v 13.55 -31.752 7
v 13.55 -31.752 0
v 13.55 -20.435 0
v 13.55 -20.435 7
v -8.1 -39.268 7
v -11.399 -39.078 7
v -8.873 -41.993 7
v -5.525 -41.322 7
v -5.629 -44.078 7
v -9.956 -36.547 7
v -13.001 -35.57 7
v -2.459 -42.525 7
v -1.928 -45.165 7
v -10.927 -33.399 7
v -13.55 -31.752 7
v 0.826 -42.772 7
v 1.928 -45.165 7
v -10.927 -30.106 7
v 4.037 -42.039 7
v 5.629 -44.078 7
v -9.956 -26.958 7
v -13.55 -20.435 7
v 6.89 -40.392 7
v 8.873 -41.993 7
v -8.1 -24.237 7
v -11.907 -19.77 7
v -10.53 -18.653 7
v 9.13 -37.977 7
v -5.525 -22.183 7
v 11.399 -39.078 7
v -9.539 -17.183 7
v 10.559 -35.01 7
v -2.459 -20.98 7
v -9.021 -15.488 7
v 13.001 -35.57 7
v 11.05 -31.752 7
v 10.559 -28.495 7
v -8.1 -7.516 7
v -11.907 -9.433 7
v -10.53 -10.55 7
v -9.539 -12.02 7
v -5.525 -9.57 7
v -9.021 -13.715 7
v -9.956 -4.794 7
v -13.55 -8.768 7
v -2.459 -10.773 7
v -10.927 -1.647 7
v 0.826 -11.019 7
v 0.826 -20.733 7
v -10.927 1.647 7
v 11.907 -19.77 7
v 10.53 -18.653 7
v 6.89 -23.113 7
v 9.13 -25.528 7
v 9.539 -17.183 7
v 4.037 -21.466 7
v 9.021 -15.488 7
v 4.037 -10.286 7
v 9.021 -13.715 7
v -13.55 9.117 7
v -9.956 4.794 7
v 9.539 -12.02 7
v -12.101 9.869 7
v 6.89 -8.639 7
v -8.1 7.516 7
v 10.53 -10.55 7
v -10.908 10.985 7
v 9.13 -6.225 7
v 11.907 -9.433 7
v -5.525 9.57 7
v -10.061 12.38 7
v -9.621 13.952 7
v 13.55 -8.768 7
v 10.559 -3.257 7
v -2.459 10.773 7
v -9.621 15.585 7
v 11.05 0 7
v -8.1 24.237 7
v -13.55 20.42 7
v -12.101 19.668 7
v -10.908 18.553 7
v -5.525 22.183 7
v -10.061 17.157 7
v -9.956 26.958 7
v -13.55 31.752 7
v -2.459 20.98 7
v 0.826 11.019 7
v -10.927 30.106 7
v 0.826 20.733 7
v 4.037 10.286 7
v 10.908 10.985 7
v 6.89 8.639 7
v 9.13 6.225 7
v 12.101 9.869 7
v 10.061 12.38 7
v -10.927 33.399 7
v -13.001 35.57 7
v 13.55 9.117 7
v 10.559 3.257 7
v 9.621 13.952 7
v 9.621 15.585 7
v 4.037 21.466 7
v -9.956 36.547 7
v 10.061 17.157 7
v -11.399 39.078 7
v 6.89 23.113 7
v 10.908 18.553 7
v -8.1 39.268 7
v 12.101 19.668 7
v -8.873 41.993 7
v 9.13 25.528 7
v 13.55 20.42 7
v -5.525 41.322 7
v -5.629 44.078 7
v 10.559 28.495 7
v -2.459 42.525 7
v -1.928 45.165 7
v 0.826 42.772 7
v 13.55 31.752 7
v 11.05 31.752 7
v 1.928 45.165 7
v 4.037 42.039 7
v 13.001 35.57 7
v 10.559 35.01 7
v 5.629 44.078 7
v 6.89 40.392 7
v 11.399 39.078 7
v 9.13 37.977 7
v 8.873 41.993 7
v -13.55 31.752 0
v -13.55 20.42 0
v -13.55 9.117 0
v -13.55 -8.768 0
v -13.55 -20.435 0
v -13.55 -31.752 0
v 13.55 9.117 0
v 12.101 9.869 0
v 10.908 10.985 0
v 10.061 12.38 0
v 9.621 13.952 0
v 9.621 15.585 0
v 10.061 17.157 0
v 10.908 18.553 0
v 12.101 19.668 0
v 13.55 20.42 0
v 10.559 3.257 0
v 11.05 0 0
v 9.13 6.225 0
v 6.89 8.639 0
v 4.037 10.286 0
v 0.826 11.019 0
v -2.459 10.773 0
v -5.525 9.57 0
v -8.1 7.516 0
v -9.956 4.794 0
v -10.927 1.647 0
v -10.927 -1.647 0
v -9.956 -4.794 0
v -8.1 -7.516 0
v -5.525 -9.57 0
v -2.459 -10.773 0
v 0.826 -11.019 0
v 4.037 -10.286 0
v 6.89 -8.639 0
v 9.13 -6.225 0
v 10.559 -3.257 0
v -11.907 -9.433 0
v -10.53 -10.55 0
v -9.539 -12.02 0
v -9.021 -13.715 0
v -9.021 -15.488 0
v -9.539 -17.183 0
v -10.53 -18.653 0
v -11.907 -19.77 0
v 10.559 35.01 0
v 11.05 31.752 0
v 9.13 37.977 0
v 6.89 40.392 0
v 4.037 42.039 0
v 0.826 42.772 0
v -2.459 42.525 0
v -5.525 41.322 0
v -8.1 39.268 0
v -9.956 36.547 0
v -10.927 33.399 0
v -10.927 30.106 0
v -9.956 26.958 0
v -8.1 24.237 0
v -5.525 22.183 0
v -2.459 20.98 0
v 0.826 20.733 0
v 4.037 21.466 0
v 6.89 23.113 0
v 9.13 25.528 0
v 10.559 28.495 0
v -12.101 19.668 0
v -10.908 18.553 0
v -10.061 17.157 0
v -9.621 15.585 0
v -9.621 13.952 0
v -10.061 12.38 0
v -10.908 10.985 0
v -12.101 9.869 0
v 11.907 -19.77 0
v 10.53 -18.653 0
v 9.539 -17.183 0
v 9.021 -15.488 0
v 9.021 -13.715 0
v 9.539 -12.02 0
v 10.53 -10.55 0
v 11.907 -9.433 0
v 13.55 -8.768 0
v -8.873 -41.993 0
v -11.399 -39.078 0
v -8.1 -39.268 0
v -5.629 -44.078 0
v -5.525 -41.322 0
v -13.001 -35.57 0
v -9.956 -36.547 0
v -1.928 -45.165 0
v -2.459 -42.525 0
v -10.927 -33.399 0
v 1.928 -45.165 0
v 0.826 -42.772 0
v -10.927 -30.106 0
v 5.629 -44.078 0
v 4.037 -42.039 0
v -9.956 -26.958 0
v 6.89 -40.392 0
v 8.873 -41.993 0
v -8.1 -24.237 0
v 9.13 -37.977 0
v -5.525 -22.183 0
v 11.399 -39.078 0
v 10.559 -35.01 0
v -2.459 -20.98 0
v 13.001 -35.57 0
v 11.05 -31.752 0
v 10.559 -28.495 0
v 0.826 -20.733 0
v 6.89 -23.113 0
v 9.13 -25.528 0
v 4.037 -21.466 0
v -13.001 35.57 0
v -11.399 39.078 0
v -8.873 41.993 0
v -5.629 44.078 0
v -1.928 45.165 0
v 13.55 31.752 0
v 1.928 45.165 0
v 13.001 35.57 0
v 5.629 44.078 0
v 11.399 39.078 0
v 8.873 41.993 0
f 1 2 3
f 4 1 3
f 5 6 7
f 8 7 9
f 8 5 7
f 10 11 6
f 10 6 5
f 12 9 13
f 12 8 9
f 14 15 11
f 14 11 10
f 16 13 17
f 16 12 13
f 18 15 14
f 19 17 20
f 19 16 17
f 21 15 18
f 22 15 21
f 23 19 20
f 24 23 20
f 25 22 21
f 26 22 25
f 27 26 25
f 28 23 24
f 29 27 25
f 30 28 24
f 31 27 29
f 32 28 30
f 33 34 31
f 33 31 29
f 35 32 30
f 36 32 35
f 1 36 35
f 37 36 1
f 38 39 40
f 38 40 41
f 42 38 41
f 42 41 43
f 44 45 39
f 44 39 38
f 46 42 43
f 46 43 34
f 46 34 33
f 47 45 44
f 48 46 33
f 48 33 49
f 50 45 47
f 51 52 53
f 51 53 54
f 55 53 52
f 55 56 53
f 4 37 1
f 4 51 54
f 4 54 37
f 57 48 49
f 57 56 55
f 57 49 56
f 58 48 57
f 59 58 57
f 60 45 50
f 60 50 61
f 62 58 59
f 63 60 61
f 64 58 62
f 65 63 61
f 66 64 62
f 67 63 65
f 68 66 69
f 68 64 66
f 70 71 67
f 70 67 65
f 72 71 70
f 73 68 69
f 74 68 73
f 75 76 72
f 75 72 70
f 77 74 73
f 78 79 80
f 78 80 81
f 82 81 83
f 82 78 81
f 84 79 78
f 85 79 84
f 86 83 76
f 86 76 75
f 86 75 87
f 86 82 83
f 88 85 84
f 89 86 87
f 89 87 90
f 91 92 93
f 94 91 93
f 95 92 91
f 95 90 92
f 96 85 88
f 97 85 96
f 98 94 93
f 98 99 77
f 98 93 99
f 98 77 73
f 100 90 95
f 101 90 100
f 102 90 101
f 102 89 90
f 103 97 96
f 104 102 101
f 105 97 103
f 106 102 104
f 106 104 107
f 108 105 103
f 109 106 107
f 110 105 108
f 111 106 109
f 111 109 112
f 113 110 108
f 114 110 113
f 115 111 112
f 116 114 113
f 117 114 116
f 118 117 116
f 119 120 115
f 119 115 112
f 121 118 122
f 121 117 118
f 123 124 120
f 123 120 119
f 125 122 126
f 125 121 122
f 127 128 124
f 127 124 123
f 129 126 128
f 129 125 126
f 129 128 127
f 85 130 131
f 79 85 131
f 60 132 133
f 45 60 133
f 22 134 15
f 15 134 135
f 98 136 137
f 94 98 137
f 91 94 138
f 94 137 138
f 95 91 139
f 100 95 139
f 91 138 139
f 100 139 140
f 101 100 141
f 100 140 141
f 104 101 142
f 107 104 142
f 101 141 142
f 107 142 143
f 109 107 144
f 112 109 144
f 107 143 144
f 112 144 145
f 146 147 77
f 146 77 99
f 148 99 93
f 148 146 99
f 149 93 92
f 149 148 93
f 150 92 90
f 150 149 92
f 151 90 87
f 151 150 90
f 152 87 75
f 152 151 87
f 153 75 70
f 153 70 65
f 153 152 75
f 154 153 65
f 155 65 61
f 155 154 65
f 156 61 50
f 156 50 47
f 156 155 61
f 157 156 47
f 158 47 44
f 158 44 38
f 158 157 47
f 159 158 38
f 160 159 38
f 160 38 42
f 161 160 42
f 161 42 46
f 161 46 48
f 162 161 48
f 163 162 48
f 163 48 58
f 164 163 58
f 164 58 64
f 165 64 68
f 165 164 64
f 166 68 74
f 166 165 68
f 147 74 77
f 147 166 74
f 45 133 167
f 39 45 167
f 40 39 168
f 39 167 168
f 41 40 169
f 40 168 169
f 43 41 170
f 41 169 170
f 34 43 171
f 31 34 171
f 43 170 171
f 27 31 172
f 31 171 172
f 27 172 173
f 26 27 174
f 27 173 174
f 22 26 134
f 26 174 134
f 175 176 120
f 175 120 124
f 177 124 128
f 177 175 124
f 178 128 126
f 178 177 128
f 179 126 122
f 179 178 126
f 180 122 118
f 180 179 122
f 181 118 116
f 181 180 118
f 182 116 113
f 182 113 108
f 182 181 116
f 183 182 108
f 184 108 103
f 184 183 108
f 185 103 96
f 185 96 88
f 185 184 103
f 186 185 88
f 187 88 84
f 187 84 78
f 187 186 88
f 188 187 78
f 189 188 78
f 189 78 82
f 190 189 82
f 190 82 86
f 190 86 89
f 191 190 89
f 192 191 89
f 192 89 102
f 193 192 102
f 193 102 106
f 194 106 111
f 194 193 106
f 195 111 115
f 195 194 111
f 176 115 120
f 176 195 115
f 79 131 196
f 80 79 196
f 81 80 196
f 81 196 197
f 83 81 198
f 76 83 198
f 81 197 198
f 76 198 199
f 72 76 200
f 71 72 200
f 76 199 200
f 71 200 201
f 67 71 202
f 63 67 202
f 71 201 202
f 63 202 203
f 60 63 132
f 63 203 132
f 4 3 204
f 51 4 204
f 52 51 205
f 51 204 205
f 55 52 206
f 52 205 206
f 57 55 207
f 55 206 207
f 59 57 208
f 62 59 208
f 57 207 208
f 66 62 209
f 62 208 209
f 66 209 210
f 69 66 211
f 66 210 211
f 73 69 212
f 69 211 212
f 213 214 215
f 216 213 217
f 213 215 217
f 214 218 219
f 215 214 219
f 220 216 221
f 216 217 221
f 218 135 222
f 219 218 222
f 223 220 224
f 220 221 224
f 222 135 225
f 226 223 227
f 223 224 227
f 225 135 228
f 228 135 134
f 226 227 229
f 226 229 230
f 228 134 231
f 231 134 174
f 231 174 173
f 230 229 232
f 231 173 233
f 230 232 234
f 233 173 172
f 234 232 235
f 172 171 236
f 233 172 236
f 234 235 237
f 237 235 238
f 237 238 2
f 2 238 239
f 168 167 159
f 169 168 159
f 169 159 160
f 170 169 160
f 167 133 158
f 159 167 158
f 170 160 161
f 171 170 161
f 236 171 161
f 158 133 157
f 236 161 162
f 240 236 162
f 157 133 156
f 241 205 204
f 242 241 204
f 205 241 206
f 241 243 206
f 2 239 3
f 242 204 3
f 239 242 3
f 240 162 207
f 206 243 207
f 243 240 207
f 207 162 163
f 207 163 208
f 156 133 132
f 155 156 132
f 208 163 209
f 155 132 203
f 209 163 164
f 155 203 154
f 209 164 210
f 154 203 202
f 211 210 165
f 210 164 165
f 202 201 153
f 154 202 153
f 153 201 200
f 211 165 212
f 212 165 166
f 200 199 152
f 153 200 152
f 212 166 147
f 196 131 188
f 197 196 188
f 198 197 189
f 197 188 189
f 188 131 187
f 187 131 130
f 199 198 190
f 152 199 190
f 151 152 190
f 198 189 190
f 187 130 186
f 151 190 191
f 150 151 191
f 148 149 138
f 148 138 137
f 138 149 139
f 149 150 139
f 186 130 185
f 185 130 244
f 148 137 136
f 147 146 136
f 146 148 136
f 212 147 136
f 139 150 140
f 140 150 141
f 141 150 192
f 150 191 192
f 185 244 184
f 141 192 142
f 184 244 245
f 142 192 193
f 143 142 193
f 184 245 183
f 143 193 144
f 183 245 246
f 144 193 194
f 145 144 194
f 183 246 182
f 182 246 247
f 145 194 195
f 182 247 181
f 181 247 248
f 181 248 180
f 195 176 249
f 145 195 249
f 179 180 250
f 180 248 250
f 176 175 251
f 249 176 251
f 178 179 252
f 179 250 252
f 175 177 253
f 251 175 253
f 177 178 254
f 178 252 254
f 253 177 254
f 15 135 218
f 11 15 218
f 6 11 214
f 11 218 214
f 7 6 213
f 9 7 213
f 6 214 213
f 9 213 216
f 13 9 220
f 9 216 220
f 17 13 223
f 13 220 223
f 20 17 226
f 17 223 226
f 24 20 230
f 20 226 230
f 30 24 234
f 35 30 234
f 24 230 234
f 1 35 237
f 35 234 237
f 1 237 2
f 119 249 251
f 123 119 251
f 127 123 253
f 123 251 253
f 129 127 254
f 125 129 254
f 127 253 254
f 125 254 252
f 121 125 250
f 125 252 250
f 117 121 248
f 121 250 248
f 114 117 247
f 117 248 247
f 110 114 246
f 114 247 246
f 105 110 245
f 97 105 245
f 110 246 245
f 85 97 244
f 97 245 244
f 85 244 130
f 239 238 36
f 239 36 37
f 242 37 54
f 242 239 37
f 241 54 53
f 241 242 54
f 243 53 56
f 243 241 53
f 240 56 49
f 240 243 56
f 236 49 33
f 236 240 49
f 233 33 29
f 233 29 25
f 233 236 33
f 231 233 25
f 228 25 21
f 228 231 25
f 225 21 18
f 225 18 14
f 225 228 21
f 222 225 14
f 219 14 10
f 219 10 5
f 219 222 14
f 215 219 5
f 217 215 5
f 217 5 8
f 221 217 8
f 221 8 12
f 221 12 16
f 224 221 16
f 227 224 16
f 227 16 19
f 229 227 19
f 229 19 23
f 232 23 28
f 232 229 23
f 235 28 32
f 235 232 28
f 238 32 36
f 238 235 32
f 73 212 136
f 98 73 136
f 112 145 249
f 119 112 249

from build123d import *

# Parameters (mm, degrees)
F0_R     = 11.05
F1_DEPTH = 7


with BuildPart() as f1:
    # F0 (on Top) → F1 (new body)
    with BuildSketch(Plane.XY):
        with BuildLine():
            Line((13.55, 20.420315), (13.55, 31.752493))
            ThreePointArc((13.55, 31.752493), (0, 45.302493), (-13.55, 31.752493))
            Line((-13.55, 31.752493), (-13.55, 20.420315))
            ThreePointArc((-13.55, 20.420315), (-9.564712, 14.768684), (-13.55, 9.117053))
            Line((-13.55, 9.117053), (-13.55, -8.768295))
            ThreePointArc((-13.55, -8.768295), (-8.954747, -14.601535), (-13.55, -20.434774))
            Line((-13.55, -20.434774), (-13.55, -31.752493))
            ThreePointArc((-13.55, -31.752493), (0, -45.302493), (13.55, -31.752493))
            Line((13.55, -31.752493), (13.55, -20.434774))
            ThreePointArc((13.55, -20.434774), (8.954747, -14.601535), (13.55, -8.768295))
            Line((13.55, -8.768295), (13.55, 9.117053))
            ThreePointArc((13.55, 9.117053), (9.564712, 14.768684), (13.55, 20.420315))
        make_face()
        with Locations((0, -31.752493)):
            Circle(F0_R, mode=Mode.SUBTRACT)
        Circle(F0_R, mode=Mode.SUBTRACT)
        with Locations((0, 31.752493)):
            Circle(F0_R, mode=Mode.SUBTRACT)
    extrude(amount=F1_DEPTH)


solid = f1.part
